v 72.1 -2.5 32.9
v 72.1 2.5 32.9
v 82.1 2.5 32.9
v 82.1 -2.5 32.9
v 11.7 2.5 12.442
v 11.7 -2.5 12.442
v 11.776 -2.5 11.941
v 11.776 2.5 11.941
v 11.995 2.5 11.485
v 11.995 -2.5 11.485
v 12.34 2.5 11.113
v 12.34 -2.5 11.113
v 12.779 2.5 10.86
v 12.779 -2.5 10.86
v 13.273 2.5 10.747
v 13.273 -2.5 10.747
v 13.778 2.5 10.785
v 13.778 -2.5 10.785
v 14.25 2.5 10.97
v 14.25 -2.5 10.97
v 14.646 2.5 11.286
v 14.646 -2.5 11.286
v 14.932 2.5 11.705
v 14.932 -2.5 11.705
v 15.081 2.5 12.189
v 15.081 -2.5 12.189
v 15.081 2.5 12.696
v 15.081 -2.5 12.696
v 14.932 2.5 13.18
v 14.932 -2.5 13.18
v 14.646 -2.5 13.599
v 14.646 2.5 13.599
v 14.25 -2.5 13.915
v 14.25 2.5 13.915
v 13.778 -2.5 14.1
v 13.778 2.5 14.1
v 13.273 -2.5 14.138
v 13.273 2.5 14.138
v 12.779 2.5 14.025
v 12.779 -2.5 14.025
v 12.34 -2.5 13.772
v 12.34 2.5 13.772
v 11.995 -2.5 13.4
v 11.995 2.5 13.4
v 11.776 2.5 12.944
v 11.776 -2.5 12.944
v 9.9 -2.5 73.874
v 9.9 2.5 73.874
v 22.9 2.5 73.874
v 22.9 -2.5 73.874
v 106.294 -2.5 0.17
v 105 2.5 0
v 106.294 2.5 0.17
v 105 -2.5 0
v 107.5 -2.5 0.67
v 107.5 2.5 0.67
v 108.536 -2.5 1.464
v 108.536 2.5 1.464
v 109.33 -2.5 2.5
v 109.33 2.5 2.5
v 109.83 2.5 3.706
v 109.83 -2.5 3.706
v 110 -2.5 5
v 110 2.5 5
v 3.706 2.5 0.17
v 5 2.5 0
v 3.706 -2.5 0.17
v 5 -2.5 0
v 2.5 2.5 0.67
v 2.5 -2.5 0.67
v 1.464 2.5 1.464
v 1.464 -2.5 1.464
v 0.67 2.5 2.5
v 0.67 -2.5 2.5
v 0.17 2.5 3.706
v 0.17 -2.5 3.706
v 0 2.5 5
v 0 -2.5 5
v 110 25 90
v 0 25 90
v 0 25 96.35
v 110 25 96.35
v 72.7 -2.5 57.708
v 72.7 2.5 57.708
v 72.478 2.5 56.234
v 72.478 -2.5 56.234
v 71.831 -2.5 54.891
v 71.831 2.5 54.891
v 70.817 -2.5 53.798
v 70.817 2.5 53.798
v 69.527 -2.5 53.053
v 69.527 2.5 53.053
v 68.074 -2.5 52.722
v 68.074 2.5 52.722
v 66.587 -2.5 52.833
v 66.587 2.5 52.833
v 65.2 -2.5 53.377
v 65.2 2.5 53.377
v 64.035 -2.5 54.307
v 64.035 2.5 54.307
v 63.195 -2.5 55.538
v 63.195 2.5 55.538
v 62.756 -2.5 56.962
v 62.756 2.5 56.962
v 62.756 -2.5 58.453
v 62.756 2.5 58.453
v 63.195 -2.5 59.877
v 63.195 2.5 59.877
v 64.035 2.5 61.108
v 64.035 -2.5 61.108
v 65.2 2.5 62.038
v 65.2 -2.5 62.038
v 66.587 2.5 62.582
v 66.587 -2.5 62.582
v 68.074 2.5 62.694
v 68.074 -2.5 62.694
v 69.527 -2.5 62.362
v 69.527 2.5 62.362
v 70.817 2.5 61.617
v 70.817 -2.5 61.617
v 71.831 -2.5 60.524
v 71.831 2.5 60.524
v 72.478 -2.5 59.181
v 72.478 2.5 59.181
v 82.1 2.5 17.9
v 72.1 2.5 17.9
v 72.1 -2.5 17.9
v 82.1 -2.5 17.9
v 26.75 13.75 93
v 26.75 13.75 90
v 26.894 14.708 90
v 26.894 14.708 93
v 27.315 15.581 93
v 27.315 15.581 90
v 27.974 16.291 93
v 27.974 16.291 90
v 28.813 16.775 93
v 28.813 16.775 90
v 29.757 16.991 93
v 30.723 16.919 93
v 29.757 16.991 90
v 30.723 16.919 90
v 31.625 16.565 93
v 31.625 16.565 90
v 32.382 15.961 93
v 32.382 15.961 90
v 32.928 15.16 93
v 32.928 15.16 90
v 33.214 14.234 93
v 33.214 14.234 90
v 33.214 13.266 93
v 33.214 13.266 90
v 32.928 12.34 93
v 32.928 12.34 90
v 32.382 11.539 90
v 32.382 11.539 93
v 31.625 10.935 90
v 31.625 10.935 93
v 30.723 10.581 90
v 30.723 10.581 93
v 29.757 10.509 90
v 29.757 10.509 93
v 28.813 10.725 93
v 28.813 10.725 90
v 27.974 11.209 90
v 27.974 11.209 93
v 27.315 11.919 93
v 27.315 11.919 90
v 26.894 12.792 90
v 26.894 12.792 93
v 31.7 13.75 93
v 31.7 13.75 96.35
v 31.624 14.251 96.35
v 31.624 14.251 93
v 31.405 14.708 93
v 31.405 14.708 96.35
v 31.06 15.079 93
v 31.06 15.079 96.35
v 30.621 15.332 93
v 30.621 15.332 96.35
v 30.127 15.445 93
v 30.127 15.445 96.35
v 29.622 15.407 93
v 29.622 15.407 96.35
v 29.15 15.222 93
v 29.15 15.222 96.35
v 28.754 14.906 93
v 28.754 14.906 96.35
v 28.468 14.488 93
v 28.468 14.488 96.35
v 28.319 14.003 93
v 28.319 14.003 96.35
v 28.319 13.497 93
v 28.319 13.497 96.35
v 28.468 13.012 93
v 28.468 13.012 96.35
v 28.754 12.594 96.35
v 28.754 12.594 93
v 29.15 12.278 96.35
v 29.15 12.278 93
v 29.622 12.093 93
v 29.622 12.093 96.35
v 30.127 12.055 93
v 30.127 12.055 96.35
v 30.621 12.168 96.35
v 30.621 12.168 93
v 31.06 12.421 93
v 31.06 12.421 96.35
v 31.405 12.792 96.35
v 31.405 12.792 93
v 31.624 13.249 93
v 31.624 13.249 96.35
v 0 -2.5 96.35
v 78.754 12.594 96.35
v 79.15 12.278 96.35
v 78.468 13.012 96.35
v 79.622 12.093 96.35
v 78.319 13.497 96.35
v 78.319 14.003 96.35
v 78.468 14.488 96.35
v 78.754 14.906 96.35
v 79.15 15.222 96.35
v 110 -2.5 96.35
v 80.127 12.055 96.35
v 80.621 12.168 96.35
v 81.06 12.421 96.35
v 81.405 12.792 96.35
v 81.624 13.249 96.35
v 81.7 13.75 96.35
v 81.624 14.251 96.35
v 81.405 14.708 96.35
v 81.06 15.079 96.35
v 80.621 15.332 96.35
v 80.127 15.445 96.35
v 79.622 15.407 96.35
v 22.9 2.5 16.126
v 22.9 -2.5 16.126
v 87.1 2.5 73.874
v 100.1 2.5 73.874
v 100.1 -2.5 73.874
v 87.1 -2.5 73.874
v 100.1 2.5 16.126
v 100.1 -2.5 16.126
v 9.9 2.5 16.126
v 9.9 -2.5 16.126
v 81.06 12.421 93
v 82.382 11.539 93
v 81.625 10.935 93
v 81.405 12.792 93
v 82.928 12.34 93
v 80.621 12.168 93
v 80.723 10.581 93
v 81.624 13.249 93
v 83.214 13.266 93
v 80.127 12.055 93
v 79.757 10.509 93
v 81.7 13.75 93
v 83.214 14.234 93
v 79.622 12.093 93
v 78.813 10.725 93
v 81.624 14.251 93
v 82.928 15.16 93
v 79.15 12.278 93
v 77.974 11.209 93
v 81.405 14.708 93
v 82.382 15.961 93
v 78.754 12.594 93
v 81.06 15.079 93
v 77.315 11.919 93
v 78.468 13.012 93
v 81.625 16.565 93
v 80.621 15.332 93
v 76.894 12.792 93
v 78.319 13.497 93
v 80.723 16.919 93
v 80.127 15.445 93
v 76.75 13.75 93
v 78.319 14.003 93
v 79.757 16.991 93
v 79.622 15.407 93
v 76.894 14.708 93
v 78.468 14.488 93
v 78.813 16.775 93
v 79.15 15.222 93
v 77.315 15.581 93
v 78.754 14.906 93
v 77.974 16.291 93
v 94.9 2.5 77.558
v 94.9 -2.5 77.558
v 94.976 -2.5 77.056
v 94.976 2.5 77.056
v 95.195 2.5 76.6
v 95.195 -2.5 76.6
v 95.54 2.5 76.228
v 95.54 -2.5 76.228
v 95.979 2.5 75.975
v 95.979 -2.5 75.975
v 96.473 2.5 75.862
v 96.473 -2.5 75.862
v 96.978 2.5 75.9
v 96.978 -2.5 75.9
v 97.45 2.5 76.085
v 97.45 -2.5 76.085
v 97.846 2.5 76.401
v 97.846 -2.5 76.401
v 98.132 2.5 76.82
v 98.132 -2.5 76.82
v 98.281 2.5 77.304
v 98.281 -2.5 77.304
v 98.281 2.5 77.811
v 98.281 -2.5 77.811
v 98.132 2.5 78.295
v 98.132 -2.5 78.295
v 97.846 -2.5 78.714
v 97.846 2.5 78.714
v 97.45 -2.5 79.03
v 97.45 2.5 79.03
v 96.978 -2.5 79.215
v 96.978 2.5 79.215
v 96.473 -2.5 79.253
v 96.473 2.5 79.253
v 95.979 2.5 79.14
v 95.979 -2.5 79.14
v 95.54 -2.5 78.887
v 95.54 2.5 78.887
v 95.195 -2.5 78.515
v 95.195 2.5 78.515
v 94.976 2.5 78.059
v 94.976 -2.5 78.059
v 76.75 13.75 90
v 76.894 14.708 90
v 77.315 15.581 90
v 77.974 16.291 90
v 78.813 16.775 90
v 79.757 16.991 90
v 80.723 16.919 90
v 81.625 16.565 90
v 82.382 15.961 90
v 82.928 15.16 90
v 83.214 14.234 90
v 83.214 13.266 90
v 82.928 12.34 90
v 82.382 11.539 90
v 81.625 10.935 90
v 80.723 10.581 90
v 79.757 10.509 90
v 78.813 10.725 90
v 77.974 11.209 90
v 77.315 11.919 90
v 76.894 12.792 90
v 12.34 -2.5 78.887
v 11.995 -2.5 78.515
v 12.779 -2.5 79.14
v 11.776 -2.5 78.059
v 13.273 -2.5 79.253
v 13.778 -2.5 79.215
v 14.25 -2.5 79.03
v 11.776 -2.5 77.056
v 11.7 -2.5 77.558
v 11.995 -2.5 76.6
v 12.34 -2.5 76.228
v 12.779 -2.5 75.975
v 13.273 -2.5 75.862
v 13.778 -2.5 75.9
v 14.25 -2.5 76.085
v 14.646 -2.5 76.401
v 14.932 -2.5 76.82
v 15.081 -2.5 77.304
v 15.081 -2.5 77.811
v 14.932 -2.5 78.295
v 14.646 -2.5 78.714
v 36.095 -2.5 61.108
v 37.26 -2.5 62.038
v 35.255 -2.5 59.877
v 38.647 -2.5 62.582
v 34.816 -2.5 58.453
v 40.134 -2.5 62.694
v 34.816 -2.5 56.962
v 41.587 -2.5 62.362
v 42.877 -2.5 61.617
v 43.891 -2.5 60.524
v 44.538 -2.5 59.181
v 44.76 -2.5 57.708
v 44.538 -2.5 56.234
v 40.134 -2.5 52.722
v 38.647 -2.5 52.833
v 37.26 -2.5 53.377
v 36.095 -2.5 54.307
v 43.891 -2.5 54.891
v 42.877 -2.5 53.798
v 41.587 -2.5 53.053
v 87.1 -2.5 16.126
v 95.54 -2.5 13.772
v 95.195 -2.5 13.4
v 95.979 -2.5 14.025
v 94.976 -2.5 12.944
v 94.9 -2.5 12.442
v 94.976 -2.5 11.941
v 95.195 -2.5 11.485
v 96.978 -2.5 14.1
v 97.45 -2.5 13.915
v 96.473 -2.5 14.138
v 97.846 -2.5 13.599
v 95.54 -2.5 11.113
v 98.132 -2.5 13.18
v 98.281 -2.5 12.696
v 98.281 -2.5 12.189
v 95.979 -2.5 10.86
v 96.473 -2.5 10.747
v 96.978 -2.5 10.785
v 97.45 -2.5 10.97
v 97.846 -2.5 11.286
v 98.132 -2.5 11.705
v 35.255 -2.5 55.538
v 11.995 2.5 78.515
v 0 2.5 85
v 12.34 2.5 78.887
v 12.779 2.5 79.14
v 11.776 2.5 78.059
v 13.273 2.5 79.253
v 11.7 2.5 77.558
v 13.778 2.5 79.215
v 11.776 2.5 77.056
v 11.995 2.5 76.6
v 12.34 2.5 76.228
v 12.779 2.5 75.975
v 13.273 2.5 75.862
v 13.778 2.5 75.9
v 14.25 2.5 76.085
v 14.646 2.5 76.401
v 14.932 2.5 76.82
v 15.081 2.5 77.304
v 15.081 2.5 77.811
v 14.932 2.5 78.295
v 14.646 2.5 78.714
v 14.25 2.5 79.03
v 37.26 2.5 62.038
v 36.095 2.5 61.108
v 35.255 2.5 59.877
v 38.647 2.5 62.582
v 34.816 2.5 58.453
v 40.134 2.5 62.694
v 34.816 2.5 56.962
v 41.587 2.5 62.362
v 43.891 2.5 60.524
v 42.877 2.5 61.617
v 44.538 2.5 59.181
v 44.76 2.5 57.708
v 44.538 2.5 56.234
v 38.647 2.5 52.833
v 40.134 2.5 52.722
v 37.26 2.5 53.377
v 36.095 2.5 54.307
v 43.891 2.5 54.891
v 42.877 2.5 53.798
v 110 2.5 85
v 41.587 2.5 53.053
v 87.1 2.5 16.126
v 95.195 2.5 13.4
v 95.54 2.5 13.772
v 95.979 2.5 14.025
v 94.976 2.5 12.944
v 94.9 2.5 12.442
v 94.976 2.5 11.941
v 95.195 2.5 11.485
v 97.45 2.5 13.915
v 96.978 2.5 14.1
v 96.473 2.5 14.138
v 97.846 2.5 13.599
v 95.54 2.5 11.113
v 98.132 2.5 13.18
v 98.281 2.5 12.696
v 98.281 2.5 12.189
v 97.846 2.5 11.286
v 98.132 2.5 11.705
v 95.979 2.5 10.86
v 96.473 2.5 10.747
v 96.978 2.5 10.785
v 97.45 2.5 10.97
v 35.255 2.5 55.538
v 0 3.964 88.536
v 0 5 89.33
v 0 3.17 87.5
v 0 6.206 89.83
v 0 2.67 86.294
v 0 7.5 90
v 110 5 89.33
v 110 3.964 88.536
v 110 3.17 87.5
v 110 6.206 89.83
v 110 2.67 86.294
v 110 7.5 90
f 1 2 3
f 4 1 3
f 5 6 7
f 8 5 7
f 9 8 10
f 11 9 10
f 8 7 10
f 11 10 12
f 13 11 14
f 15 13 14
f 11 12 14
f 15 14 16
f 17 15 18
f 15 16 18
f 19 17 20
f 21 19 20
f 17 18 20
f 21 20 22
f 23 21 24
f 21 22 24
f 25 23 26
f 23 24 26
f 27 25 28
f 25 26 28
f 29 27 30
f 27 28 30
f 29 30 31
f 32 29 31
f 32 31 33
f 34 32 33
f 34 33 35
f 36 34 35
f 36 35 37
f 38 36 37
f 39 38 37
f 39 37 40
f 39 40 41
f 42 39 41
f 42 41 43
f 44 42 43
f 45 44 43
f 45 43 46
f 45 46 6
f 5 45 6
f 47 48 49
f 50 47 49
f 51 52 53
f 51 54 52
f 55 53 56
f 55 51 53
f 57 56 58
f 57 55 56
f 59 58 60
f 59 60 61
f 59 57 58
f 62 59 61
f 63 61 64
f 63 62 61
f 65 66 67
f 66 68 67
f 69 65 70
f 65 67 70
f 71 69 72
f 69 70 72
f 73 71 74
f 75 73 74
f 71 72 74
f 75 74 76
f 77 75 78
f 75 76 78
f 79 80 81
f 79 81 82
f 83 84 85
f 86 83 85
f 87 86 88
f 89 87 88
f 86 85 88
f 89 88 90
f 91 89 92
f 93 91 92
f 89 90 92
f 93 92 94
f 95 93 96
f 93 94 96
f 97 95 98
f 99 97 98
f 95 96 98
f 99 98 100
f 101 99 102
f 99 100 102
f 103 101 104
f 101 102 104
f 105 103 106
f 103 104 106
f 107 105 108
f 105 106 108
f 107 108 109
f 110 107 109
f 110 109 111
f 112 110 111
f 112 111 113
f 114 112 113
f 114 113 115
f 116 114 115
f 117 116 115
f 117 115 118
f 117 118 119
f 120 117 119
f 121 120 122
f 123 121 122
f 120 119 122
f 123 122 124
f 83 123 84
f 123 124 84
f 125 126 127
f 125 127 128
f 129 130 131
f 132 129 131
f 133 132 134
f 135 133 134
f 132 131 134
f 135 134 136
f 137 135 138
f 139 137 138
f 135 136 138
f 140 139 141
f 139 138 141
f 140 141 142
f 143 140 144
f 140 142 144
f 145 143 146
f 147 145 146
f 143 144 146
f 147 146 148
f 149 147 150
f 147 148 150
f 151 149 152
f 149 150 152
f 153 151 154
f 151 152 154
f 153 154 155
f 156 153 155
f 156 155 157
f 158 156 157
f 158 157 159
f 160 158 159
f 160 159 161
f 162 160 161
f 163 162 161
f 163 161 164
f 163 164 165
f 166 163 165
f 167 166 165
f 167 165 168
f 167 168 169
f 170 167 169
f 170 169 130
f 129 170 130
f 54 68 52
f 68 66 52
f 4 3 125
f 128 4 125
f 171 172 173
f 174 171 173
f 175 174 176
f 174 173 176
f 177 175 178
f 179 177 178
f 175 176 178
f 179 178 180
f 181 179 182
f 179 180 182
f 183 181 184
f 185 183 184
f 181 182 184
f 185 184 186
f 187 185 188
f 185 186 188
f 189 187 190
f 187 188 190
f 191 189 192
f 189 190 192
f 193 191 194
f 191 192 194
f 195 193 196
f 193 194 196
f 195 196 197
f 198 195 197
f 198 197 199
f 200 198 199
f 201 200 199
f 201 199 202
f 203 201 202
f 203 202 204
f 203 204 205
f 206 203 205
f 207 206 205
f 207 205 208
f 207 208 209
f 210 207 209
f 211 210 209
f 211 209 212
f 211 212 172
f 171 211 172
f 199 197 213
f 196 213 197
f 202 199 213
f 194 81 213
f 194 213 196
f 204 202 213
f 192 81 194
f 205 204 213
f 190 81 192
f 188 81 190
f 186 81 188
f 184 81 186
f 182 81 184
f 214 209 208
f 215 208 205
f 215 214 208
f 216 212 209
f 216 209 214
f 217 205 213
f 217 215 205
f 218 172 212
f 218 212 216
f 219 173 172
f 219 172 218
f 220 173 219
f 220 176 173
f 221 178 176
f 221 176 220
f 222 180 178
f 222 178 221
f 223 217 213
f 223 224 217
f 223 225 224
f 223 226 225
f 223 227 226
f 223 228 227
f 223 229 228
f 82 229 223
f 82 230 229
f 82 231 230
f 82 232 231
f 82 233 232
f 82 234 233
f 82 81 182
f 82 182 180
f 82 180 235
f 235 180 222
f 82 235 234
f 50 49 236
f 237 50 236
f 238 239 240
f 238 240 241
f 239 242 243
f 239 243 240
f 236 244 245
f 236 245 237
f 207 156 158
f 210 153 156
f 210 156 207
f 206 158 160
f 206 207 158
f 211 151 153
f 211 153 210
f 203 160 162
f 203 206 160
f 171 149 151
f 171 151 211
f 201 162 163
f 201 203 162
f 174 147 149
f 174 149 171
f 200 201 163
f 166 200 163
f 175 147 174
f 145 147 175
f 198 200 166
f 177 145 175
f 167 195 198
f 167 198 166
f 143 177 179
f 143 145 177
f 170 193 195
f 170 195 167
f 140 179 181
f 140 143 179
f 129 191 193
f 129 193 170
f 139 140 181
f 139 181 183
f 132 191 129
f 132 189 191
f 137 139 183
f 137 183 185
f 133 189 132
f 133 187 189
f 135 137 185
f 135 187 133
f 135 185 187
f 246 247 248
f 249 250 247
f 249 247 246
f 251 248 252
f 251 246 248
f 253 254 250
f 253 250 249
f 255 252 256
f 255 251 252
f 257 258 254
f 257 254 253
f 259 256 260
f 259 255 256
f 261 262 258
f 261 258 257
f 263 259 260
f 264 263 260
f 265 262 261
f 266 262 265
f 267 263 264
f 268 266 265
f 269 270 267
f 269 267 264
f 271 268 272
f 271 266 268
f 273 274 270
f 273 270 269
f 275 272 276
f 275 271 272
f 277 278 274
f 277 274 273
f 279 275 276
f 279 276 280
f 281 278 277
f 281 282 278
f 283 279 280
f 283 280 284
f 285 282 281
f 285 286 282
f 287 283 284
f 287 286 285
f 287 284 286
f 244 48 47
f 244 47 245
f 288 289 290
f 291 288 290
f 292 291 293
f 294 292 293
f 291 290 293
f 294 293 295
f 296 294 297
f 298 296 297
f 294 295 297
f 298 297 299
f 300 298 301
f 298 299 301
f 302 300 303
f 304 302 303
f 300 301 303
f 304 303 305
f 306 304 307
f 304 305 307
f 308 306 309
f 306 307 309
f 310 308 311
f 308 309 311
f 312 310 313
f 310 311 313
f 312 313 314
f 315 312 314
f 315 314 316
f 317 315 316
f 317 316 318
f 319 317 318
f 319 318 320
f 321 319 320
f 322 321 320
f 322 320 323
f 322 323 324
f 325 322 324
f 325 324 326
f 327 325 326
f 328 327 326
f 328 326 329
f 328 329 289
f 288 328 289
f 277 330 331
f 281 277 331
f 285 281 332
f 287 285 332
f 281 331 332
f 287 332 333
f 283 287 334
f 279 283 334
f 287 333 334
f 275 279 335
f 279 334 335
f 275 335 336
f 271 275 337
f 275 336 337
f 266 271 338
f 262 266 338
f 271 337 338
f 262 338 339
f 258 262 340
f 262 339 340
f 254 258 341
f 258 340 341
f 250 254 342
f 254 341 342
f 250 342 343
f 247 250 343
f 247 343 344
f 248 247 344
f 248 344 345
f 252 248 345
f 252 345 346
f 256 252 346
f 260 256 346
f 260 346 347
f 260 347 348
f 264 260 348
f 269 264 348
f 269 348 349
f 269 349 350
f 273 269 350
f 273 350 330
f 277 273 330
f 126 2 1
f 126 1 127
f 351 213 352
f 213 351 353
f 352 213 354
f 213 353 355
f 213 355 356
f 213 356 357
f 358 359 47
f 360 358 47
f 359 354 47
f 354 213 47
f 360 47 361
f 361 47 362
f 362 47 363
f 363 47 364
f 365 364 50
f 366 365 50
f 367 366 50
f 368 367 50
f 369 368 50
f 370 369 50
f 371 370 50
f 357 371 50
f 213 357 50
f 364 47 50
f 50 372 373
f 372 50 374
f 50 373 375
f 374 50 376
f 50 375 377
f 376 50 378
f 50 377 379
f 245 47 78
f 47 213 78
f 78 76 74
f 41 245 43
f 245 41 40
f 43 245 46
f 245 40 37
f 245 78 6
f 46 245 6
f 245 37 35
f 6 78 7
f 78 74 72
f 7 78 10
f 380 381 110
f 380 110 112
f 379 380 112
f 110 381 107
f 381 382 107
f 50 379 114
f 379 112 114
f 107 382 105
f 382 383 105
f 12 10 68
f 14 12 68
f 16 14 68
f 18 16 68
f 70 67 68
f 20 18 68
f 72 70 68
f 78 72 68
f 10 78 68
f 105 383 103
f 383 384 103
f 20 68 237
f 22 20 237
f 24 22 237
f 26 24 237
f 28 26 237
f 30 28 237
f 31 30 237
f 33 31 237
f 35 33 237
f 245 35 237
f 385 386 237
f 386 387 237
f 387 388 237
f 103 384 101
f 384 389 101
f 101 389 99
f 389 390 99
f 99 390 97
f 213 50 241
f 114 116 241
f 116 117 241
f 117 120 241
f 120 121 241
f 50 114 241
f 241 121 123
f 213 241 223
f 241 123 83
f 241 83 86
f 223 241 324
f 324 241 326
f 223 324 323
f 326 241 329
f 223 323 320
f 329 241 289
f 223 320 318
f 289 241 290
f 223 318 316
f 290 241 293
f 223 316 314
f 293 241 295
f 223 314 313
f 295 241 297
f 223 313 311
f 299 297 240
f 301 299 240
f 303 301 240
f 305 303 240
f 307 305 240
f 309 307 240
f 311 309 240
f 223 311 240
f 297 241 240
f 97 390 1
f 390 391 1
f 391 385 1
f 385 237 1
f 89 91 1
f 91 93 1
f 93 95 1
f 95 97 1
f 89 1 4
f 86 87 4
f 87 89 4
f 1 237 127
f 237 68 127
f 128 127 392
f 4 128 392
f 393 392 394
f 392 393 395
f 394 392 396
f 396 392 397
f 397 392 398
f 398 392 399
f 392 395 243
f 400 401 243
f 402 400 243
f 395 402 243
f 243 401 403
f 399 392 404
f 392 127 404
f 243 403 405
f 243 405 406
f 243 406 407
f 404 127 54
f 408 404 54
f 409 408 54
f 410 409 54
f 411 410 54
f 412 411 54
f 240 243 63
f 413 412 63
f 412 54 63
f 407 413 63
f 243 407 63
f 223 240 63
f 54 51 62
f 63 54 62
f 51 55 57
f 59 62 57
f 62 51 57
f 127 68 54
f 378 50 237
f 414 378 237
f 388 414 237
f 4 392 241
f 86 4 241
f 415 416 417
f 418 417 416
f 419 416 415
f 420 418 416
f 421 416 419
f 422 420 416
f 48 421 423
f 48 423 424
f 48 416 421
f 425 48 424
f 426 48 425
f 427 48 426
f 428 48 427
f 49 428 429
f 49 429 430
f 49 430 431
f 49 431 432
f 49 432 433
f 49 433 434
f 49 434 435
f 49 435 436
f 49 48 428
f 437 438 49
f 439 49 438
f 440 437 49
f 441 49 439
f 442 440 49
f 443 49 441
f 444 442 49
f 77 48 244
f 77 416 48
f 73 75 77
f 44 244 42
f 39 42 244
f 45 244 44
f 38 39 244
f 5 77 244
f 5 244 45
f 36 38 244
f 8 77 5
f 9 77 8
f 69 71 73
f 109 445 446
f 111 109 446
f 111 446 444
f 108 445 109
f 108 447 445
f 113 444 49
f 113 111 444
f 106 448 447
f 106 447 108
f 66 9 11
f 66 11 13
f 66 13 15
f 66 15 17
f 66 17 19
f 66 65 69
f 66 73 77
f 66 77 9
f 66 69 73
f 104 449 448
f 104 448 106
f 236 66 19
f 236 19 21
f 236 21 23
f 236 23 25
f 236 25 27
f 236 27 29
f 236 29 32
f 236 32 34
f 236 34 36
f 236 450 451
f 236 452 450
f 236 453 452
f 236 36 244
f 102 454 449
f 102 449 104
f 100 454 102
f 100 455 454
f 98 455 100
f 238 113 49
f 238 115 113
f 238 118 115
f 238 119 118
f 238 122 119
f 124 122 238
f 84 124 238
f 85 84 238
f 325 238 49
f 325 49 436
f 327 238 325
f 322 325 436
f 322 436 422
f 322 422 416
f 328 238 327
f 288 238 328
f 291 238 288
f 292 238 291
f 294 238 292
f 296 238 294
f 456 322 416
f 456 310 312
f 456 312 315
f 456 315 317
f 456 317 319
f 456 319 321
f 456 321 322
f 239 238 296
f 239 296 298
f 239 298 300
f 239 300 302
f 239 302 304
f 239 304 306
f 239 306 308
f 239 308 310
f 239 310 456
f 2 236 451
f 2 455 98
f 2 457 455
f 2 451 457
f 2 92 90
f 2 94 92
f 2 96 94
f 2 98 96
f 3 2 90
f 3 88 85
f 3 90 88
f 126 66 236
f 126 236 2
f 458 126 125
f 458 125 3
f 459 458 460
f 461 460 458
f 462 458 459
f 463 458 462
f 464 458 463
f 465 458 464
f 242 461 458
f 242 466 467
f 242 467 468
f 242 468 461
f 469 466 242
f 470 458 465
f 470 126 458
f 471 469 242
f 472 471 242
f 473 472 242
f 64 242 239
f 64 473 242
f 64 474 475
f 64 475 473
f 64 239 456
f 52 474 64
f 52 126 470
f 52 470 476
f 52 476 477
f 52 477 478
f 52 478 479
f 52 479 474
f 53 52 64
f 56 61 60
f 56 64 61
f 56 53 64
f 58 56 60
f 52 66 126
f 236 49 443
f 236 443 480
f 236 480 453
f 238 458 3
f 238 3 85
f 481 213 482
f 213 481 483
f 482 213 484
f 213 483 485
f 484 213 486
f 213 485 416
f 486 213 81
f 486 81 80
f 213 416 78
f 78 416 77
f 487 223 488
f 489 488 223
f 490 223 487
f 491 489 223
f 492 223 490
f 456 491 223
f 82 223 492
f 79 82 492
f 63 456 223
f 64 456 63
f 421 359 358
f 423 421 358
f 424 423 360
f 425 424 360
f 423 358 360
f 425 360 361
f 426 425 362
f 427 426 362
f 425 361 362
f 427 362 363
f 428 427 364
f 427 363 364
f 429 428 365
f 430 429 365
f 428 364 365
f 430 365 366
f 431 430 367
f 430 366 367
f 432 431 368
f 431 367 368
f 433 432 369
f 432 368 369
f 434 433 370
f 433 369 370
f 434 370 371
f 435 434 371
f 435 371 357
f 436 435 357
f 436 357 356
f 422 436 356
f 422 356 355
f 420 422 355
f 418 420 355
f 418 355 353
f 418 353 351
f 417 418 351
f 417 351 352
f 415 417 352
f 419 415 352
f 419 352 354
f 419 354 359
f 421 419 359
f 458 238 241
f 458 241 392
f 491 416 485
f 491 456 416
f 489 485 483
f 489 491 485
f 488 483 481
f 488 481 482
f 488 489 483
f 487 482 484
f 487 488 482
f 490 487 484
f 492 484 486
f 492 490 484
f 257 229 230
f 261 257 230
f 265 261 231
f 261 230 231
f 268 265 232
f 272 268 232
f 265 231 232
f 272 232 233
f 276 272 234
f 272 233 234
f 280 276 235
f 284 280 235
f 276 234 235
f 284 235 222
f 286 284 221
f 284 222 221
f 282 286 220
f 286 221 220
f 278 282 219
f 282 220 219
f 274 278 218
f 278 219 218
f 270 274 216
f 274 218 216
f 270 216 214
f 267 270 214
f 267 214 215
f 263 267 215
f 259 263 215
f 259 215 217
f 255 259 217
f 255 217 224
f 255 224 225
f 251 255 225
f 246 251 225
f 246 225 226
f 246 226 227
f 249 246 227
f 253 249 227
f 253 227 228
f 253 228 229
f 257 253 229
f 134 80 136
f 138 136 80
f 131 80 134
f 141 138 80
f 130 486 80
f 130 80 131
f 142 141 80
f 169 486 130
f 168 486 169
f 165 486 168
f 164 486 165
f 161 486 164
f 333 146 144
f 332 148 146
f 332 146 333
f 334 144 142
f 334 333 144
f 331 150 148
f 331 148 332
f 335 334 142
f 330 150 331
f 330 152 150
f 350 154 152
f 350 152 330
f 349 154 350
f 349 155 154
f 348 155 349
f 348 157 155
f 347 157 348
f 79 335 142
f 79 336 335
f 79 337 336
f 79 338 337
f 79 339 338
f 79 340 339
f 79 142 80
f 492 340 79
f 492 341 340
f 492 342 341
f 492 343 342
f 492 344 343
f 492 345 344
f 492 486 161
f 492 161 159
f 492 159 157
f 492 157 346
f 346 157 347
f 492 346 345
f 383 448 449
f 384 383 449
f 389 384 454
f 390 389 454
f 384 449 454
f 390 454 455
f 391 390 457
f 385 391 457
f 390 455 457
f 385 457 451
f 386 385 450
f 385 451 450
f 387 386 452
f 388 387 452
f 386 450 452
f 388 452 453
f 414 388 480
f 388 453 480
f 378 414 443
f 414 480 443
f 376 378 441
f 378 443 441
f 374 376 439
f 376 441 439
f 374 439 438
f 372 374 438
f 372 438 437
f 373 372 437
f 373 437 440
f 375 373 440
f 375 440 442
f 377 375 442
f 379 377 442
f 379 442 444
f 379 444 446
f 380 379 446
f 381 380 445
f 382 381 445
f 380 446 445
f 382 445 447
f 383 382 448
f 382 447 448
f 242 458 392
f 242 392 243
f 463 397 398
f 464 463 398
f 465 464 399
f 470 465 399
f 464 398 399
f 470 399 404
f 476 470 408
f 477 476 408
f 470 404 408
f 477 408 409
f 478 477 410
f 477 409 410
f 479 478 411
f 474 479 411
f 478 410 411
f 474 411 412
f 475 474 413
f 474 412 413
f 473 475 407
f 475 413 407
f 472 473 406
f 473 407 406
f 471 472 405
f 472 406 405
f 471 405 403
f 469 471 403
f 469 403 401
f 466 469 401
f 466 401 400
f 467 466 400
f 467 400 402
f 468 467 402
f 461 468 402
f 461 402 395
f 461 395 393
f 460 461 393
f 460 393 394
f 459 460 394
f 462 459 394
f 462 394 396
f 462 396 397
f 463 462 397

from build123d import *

# Parameters (mm, degrees)
SKETCH1_W                      = 110
SKETCH1_H                      = 90
BOSS_EXTRUDE1_DEPTH            = 2.5
M3_CLEARANCE_HOLE1_D           = 3.4
M3_CLEARANCE_HOLE1_DEPTH       = 5
SKETCH5_W                      = 110
SKETCH5_H                      = 6.35
BOSS_EXTRUDE2_DEPTH            = 25
BOSS_EXTRUDE2_DEPTH_BACK       = 2.5
CBORE_FOR_M3_SHCS1_D           = 3.4
CBORE_FOR_M3_SHCS1_DEPTH       = 6.35
CBORE_FOR_M3_SHCS1_CBORE_D     = 6.5
CBORE_FOR_M3_SHCS1_CBORE_DEPTH = 3
CUT_EXTRUDE1_DEPTH             = 6
SKETCH10_W                     = 74.2
SKETCH10_H                     = 70.2
SKETCH10_R                     = 5
SKETCH10_W_2                   = 10
SKETCH10_H_2                   = 15
BOSS_EXTRUDE4_DEPTH            = 5
SKETCH11_W                     = 5
SKETCH11_H                     = 57.74767184
CUT_EXTRUDE2_DEPTH             = 6
FILLET1_R                      = 5


with BuildPart() as part:
    # Sketch1 → Boss-Extrude1 (new body, symmetric)
    with BuildSketch(Plane(origin=(0, 0, 0), x_dir=(1, 0, 0), z_dir=(0, 1, 0))):
        with Locations((55, -45)):
            Rectangle(SKETCH1_W, SKETCH1_H)
    extrude(amount=BOSS_EXTRUDE1_DEPTH, both=True)

    # M3 Clearance Hole1
    with Locations(Plane(origin=(0, 2.5, 0), x_dir=(1, 0, 0), z_dir=(0, 1, 0))):
        with Locations((13.4, -77.55755), (96.6, -12.44245), (96.6, -77.55755), (13.4, -12.44245)):
            Hole(M3_CLEARANCE_HOLE1_D / 2, depth=M3_CLEARANCE_HOLE1_DEPTH)

    # Sketch5 → Boss-Extrude2 (add, two sides)
    with BuildSketch(Plane(origin=(0, 0, 0), x_dir=(1, 0, 0), z_dir=(0, 1, 0))) as boss_extrude2_sk:
        with Locations((55, -93.175)):
            Rectangle(SKETCH5_W, SKETCH5_H)
    extrude(amount=BOSS_EXTRUDE2_DEPTH)
    extrude(boss_extrude2_sk.sketch, amount=-BOSS_EXTRUDE2_DEPTH_BACK)

    # CBORE for M3 SHCS1
    with Locations(Plane(origin=(0, 0, 90), x_dir=(-1, 0, 0), z_dir=(0, 0, -1))):
        with Locations((-80, 13.75), (-30, 13.75)):
            CounterBoreHole(CBORE_FOR_M3_SHCS1_D / 2, CBORE_FOR_M3_SHCS1_CBORE_D / 2, CBORE_FOR_M3_SHCS1_CBORE_DEPTH, depth=CBORE_FOR_M3_SHCS1_DEPTH)

    # Sketch8 → Cut-Extrude1 (cut, through all)
    with BuildSketch(Plane(origin=(0, 2.5, 0), x_dir=(1, 0, 0), z_dir=(0, 1, 0))):
        Polygon((17.9, -9.9), (92.1, -9.9), (92.1, -16.12616408), (100.1, -16.12616408), (100.1, -73.87383592), (92.1, -73.87383592), (92.1, -80.1), (17.9, -80.1), (17.9, -73.87383592), (9.9, -73.87383592), (9.9, -16.12616408), (17.9, -16.12616408), align=None)
    extrude(amount=-CUT_EXTRUDE1_DEPTH, mode=Mode.SUBTRACT)

    # Sketch10 → Boss-Extrude4 (add, through all)
    with BuildSketch(Plane(origin=(0, 2.5, 0), x_dir=(1, 0, 0), z_dir=(0, 1, 0))):
        with Locations((55, -45)):
            Rectangle(SKETCH10_W, SKETCH10_H)
        with Locations((39.76, -57.70755)):
            Circle(SKETCH10_R, mode=Mode.SUBTRACT)
        with Locations((67.7, -57.70755)):
            Circle(SKETCH10_R, mode=Mode.SUBTRACT)
        with Locations((77.1, -25.4)):
            Rectangle(SKETCH10_W_2, SKETCH10_H_2, mode=Mode.SUBTRACT)
    extrude(amount=-BOSS_EXTRUDE4_DEPTH)

    # Sketch11 → Cut-Extrude2 (cut, through all)
    with BuildSketch(Plane(origin=(0, 2.5, 0), x_dir=(1, 0, 0), z_dir=(0, 1, 0))):
        with Locations((20.4, -45)):
            Rectangle(SKETCH11_W, SKETCH11_H)
        with Locations((89.6, -45)):
            Rectangle(SKETCH11_W, SKETCH11_H)
    extrude(amount=-CUT_EXTRUDE2_DEPTH, mode=Mode.SUBTRACT)

    # Fillet1
    fillet1_edges = [part.edges().sort_by_distance(p)[0] for p in [
        (0, 0, 0),
        (110, 0, 0),
        (55, 2.5, 90),
    ]]
    fillet(fillet1_edges, radius=FILLET1_R)


solid = part.part
